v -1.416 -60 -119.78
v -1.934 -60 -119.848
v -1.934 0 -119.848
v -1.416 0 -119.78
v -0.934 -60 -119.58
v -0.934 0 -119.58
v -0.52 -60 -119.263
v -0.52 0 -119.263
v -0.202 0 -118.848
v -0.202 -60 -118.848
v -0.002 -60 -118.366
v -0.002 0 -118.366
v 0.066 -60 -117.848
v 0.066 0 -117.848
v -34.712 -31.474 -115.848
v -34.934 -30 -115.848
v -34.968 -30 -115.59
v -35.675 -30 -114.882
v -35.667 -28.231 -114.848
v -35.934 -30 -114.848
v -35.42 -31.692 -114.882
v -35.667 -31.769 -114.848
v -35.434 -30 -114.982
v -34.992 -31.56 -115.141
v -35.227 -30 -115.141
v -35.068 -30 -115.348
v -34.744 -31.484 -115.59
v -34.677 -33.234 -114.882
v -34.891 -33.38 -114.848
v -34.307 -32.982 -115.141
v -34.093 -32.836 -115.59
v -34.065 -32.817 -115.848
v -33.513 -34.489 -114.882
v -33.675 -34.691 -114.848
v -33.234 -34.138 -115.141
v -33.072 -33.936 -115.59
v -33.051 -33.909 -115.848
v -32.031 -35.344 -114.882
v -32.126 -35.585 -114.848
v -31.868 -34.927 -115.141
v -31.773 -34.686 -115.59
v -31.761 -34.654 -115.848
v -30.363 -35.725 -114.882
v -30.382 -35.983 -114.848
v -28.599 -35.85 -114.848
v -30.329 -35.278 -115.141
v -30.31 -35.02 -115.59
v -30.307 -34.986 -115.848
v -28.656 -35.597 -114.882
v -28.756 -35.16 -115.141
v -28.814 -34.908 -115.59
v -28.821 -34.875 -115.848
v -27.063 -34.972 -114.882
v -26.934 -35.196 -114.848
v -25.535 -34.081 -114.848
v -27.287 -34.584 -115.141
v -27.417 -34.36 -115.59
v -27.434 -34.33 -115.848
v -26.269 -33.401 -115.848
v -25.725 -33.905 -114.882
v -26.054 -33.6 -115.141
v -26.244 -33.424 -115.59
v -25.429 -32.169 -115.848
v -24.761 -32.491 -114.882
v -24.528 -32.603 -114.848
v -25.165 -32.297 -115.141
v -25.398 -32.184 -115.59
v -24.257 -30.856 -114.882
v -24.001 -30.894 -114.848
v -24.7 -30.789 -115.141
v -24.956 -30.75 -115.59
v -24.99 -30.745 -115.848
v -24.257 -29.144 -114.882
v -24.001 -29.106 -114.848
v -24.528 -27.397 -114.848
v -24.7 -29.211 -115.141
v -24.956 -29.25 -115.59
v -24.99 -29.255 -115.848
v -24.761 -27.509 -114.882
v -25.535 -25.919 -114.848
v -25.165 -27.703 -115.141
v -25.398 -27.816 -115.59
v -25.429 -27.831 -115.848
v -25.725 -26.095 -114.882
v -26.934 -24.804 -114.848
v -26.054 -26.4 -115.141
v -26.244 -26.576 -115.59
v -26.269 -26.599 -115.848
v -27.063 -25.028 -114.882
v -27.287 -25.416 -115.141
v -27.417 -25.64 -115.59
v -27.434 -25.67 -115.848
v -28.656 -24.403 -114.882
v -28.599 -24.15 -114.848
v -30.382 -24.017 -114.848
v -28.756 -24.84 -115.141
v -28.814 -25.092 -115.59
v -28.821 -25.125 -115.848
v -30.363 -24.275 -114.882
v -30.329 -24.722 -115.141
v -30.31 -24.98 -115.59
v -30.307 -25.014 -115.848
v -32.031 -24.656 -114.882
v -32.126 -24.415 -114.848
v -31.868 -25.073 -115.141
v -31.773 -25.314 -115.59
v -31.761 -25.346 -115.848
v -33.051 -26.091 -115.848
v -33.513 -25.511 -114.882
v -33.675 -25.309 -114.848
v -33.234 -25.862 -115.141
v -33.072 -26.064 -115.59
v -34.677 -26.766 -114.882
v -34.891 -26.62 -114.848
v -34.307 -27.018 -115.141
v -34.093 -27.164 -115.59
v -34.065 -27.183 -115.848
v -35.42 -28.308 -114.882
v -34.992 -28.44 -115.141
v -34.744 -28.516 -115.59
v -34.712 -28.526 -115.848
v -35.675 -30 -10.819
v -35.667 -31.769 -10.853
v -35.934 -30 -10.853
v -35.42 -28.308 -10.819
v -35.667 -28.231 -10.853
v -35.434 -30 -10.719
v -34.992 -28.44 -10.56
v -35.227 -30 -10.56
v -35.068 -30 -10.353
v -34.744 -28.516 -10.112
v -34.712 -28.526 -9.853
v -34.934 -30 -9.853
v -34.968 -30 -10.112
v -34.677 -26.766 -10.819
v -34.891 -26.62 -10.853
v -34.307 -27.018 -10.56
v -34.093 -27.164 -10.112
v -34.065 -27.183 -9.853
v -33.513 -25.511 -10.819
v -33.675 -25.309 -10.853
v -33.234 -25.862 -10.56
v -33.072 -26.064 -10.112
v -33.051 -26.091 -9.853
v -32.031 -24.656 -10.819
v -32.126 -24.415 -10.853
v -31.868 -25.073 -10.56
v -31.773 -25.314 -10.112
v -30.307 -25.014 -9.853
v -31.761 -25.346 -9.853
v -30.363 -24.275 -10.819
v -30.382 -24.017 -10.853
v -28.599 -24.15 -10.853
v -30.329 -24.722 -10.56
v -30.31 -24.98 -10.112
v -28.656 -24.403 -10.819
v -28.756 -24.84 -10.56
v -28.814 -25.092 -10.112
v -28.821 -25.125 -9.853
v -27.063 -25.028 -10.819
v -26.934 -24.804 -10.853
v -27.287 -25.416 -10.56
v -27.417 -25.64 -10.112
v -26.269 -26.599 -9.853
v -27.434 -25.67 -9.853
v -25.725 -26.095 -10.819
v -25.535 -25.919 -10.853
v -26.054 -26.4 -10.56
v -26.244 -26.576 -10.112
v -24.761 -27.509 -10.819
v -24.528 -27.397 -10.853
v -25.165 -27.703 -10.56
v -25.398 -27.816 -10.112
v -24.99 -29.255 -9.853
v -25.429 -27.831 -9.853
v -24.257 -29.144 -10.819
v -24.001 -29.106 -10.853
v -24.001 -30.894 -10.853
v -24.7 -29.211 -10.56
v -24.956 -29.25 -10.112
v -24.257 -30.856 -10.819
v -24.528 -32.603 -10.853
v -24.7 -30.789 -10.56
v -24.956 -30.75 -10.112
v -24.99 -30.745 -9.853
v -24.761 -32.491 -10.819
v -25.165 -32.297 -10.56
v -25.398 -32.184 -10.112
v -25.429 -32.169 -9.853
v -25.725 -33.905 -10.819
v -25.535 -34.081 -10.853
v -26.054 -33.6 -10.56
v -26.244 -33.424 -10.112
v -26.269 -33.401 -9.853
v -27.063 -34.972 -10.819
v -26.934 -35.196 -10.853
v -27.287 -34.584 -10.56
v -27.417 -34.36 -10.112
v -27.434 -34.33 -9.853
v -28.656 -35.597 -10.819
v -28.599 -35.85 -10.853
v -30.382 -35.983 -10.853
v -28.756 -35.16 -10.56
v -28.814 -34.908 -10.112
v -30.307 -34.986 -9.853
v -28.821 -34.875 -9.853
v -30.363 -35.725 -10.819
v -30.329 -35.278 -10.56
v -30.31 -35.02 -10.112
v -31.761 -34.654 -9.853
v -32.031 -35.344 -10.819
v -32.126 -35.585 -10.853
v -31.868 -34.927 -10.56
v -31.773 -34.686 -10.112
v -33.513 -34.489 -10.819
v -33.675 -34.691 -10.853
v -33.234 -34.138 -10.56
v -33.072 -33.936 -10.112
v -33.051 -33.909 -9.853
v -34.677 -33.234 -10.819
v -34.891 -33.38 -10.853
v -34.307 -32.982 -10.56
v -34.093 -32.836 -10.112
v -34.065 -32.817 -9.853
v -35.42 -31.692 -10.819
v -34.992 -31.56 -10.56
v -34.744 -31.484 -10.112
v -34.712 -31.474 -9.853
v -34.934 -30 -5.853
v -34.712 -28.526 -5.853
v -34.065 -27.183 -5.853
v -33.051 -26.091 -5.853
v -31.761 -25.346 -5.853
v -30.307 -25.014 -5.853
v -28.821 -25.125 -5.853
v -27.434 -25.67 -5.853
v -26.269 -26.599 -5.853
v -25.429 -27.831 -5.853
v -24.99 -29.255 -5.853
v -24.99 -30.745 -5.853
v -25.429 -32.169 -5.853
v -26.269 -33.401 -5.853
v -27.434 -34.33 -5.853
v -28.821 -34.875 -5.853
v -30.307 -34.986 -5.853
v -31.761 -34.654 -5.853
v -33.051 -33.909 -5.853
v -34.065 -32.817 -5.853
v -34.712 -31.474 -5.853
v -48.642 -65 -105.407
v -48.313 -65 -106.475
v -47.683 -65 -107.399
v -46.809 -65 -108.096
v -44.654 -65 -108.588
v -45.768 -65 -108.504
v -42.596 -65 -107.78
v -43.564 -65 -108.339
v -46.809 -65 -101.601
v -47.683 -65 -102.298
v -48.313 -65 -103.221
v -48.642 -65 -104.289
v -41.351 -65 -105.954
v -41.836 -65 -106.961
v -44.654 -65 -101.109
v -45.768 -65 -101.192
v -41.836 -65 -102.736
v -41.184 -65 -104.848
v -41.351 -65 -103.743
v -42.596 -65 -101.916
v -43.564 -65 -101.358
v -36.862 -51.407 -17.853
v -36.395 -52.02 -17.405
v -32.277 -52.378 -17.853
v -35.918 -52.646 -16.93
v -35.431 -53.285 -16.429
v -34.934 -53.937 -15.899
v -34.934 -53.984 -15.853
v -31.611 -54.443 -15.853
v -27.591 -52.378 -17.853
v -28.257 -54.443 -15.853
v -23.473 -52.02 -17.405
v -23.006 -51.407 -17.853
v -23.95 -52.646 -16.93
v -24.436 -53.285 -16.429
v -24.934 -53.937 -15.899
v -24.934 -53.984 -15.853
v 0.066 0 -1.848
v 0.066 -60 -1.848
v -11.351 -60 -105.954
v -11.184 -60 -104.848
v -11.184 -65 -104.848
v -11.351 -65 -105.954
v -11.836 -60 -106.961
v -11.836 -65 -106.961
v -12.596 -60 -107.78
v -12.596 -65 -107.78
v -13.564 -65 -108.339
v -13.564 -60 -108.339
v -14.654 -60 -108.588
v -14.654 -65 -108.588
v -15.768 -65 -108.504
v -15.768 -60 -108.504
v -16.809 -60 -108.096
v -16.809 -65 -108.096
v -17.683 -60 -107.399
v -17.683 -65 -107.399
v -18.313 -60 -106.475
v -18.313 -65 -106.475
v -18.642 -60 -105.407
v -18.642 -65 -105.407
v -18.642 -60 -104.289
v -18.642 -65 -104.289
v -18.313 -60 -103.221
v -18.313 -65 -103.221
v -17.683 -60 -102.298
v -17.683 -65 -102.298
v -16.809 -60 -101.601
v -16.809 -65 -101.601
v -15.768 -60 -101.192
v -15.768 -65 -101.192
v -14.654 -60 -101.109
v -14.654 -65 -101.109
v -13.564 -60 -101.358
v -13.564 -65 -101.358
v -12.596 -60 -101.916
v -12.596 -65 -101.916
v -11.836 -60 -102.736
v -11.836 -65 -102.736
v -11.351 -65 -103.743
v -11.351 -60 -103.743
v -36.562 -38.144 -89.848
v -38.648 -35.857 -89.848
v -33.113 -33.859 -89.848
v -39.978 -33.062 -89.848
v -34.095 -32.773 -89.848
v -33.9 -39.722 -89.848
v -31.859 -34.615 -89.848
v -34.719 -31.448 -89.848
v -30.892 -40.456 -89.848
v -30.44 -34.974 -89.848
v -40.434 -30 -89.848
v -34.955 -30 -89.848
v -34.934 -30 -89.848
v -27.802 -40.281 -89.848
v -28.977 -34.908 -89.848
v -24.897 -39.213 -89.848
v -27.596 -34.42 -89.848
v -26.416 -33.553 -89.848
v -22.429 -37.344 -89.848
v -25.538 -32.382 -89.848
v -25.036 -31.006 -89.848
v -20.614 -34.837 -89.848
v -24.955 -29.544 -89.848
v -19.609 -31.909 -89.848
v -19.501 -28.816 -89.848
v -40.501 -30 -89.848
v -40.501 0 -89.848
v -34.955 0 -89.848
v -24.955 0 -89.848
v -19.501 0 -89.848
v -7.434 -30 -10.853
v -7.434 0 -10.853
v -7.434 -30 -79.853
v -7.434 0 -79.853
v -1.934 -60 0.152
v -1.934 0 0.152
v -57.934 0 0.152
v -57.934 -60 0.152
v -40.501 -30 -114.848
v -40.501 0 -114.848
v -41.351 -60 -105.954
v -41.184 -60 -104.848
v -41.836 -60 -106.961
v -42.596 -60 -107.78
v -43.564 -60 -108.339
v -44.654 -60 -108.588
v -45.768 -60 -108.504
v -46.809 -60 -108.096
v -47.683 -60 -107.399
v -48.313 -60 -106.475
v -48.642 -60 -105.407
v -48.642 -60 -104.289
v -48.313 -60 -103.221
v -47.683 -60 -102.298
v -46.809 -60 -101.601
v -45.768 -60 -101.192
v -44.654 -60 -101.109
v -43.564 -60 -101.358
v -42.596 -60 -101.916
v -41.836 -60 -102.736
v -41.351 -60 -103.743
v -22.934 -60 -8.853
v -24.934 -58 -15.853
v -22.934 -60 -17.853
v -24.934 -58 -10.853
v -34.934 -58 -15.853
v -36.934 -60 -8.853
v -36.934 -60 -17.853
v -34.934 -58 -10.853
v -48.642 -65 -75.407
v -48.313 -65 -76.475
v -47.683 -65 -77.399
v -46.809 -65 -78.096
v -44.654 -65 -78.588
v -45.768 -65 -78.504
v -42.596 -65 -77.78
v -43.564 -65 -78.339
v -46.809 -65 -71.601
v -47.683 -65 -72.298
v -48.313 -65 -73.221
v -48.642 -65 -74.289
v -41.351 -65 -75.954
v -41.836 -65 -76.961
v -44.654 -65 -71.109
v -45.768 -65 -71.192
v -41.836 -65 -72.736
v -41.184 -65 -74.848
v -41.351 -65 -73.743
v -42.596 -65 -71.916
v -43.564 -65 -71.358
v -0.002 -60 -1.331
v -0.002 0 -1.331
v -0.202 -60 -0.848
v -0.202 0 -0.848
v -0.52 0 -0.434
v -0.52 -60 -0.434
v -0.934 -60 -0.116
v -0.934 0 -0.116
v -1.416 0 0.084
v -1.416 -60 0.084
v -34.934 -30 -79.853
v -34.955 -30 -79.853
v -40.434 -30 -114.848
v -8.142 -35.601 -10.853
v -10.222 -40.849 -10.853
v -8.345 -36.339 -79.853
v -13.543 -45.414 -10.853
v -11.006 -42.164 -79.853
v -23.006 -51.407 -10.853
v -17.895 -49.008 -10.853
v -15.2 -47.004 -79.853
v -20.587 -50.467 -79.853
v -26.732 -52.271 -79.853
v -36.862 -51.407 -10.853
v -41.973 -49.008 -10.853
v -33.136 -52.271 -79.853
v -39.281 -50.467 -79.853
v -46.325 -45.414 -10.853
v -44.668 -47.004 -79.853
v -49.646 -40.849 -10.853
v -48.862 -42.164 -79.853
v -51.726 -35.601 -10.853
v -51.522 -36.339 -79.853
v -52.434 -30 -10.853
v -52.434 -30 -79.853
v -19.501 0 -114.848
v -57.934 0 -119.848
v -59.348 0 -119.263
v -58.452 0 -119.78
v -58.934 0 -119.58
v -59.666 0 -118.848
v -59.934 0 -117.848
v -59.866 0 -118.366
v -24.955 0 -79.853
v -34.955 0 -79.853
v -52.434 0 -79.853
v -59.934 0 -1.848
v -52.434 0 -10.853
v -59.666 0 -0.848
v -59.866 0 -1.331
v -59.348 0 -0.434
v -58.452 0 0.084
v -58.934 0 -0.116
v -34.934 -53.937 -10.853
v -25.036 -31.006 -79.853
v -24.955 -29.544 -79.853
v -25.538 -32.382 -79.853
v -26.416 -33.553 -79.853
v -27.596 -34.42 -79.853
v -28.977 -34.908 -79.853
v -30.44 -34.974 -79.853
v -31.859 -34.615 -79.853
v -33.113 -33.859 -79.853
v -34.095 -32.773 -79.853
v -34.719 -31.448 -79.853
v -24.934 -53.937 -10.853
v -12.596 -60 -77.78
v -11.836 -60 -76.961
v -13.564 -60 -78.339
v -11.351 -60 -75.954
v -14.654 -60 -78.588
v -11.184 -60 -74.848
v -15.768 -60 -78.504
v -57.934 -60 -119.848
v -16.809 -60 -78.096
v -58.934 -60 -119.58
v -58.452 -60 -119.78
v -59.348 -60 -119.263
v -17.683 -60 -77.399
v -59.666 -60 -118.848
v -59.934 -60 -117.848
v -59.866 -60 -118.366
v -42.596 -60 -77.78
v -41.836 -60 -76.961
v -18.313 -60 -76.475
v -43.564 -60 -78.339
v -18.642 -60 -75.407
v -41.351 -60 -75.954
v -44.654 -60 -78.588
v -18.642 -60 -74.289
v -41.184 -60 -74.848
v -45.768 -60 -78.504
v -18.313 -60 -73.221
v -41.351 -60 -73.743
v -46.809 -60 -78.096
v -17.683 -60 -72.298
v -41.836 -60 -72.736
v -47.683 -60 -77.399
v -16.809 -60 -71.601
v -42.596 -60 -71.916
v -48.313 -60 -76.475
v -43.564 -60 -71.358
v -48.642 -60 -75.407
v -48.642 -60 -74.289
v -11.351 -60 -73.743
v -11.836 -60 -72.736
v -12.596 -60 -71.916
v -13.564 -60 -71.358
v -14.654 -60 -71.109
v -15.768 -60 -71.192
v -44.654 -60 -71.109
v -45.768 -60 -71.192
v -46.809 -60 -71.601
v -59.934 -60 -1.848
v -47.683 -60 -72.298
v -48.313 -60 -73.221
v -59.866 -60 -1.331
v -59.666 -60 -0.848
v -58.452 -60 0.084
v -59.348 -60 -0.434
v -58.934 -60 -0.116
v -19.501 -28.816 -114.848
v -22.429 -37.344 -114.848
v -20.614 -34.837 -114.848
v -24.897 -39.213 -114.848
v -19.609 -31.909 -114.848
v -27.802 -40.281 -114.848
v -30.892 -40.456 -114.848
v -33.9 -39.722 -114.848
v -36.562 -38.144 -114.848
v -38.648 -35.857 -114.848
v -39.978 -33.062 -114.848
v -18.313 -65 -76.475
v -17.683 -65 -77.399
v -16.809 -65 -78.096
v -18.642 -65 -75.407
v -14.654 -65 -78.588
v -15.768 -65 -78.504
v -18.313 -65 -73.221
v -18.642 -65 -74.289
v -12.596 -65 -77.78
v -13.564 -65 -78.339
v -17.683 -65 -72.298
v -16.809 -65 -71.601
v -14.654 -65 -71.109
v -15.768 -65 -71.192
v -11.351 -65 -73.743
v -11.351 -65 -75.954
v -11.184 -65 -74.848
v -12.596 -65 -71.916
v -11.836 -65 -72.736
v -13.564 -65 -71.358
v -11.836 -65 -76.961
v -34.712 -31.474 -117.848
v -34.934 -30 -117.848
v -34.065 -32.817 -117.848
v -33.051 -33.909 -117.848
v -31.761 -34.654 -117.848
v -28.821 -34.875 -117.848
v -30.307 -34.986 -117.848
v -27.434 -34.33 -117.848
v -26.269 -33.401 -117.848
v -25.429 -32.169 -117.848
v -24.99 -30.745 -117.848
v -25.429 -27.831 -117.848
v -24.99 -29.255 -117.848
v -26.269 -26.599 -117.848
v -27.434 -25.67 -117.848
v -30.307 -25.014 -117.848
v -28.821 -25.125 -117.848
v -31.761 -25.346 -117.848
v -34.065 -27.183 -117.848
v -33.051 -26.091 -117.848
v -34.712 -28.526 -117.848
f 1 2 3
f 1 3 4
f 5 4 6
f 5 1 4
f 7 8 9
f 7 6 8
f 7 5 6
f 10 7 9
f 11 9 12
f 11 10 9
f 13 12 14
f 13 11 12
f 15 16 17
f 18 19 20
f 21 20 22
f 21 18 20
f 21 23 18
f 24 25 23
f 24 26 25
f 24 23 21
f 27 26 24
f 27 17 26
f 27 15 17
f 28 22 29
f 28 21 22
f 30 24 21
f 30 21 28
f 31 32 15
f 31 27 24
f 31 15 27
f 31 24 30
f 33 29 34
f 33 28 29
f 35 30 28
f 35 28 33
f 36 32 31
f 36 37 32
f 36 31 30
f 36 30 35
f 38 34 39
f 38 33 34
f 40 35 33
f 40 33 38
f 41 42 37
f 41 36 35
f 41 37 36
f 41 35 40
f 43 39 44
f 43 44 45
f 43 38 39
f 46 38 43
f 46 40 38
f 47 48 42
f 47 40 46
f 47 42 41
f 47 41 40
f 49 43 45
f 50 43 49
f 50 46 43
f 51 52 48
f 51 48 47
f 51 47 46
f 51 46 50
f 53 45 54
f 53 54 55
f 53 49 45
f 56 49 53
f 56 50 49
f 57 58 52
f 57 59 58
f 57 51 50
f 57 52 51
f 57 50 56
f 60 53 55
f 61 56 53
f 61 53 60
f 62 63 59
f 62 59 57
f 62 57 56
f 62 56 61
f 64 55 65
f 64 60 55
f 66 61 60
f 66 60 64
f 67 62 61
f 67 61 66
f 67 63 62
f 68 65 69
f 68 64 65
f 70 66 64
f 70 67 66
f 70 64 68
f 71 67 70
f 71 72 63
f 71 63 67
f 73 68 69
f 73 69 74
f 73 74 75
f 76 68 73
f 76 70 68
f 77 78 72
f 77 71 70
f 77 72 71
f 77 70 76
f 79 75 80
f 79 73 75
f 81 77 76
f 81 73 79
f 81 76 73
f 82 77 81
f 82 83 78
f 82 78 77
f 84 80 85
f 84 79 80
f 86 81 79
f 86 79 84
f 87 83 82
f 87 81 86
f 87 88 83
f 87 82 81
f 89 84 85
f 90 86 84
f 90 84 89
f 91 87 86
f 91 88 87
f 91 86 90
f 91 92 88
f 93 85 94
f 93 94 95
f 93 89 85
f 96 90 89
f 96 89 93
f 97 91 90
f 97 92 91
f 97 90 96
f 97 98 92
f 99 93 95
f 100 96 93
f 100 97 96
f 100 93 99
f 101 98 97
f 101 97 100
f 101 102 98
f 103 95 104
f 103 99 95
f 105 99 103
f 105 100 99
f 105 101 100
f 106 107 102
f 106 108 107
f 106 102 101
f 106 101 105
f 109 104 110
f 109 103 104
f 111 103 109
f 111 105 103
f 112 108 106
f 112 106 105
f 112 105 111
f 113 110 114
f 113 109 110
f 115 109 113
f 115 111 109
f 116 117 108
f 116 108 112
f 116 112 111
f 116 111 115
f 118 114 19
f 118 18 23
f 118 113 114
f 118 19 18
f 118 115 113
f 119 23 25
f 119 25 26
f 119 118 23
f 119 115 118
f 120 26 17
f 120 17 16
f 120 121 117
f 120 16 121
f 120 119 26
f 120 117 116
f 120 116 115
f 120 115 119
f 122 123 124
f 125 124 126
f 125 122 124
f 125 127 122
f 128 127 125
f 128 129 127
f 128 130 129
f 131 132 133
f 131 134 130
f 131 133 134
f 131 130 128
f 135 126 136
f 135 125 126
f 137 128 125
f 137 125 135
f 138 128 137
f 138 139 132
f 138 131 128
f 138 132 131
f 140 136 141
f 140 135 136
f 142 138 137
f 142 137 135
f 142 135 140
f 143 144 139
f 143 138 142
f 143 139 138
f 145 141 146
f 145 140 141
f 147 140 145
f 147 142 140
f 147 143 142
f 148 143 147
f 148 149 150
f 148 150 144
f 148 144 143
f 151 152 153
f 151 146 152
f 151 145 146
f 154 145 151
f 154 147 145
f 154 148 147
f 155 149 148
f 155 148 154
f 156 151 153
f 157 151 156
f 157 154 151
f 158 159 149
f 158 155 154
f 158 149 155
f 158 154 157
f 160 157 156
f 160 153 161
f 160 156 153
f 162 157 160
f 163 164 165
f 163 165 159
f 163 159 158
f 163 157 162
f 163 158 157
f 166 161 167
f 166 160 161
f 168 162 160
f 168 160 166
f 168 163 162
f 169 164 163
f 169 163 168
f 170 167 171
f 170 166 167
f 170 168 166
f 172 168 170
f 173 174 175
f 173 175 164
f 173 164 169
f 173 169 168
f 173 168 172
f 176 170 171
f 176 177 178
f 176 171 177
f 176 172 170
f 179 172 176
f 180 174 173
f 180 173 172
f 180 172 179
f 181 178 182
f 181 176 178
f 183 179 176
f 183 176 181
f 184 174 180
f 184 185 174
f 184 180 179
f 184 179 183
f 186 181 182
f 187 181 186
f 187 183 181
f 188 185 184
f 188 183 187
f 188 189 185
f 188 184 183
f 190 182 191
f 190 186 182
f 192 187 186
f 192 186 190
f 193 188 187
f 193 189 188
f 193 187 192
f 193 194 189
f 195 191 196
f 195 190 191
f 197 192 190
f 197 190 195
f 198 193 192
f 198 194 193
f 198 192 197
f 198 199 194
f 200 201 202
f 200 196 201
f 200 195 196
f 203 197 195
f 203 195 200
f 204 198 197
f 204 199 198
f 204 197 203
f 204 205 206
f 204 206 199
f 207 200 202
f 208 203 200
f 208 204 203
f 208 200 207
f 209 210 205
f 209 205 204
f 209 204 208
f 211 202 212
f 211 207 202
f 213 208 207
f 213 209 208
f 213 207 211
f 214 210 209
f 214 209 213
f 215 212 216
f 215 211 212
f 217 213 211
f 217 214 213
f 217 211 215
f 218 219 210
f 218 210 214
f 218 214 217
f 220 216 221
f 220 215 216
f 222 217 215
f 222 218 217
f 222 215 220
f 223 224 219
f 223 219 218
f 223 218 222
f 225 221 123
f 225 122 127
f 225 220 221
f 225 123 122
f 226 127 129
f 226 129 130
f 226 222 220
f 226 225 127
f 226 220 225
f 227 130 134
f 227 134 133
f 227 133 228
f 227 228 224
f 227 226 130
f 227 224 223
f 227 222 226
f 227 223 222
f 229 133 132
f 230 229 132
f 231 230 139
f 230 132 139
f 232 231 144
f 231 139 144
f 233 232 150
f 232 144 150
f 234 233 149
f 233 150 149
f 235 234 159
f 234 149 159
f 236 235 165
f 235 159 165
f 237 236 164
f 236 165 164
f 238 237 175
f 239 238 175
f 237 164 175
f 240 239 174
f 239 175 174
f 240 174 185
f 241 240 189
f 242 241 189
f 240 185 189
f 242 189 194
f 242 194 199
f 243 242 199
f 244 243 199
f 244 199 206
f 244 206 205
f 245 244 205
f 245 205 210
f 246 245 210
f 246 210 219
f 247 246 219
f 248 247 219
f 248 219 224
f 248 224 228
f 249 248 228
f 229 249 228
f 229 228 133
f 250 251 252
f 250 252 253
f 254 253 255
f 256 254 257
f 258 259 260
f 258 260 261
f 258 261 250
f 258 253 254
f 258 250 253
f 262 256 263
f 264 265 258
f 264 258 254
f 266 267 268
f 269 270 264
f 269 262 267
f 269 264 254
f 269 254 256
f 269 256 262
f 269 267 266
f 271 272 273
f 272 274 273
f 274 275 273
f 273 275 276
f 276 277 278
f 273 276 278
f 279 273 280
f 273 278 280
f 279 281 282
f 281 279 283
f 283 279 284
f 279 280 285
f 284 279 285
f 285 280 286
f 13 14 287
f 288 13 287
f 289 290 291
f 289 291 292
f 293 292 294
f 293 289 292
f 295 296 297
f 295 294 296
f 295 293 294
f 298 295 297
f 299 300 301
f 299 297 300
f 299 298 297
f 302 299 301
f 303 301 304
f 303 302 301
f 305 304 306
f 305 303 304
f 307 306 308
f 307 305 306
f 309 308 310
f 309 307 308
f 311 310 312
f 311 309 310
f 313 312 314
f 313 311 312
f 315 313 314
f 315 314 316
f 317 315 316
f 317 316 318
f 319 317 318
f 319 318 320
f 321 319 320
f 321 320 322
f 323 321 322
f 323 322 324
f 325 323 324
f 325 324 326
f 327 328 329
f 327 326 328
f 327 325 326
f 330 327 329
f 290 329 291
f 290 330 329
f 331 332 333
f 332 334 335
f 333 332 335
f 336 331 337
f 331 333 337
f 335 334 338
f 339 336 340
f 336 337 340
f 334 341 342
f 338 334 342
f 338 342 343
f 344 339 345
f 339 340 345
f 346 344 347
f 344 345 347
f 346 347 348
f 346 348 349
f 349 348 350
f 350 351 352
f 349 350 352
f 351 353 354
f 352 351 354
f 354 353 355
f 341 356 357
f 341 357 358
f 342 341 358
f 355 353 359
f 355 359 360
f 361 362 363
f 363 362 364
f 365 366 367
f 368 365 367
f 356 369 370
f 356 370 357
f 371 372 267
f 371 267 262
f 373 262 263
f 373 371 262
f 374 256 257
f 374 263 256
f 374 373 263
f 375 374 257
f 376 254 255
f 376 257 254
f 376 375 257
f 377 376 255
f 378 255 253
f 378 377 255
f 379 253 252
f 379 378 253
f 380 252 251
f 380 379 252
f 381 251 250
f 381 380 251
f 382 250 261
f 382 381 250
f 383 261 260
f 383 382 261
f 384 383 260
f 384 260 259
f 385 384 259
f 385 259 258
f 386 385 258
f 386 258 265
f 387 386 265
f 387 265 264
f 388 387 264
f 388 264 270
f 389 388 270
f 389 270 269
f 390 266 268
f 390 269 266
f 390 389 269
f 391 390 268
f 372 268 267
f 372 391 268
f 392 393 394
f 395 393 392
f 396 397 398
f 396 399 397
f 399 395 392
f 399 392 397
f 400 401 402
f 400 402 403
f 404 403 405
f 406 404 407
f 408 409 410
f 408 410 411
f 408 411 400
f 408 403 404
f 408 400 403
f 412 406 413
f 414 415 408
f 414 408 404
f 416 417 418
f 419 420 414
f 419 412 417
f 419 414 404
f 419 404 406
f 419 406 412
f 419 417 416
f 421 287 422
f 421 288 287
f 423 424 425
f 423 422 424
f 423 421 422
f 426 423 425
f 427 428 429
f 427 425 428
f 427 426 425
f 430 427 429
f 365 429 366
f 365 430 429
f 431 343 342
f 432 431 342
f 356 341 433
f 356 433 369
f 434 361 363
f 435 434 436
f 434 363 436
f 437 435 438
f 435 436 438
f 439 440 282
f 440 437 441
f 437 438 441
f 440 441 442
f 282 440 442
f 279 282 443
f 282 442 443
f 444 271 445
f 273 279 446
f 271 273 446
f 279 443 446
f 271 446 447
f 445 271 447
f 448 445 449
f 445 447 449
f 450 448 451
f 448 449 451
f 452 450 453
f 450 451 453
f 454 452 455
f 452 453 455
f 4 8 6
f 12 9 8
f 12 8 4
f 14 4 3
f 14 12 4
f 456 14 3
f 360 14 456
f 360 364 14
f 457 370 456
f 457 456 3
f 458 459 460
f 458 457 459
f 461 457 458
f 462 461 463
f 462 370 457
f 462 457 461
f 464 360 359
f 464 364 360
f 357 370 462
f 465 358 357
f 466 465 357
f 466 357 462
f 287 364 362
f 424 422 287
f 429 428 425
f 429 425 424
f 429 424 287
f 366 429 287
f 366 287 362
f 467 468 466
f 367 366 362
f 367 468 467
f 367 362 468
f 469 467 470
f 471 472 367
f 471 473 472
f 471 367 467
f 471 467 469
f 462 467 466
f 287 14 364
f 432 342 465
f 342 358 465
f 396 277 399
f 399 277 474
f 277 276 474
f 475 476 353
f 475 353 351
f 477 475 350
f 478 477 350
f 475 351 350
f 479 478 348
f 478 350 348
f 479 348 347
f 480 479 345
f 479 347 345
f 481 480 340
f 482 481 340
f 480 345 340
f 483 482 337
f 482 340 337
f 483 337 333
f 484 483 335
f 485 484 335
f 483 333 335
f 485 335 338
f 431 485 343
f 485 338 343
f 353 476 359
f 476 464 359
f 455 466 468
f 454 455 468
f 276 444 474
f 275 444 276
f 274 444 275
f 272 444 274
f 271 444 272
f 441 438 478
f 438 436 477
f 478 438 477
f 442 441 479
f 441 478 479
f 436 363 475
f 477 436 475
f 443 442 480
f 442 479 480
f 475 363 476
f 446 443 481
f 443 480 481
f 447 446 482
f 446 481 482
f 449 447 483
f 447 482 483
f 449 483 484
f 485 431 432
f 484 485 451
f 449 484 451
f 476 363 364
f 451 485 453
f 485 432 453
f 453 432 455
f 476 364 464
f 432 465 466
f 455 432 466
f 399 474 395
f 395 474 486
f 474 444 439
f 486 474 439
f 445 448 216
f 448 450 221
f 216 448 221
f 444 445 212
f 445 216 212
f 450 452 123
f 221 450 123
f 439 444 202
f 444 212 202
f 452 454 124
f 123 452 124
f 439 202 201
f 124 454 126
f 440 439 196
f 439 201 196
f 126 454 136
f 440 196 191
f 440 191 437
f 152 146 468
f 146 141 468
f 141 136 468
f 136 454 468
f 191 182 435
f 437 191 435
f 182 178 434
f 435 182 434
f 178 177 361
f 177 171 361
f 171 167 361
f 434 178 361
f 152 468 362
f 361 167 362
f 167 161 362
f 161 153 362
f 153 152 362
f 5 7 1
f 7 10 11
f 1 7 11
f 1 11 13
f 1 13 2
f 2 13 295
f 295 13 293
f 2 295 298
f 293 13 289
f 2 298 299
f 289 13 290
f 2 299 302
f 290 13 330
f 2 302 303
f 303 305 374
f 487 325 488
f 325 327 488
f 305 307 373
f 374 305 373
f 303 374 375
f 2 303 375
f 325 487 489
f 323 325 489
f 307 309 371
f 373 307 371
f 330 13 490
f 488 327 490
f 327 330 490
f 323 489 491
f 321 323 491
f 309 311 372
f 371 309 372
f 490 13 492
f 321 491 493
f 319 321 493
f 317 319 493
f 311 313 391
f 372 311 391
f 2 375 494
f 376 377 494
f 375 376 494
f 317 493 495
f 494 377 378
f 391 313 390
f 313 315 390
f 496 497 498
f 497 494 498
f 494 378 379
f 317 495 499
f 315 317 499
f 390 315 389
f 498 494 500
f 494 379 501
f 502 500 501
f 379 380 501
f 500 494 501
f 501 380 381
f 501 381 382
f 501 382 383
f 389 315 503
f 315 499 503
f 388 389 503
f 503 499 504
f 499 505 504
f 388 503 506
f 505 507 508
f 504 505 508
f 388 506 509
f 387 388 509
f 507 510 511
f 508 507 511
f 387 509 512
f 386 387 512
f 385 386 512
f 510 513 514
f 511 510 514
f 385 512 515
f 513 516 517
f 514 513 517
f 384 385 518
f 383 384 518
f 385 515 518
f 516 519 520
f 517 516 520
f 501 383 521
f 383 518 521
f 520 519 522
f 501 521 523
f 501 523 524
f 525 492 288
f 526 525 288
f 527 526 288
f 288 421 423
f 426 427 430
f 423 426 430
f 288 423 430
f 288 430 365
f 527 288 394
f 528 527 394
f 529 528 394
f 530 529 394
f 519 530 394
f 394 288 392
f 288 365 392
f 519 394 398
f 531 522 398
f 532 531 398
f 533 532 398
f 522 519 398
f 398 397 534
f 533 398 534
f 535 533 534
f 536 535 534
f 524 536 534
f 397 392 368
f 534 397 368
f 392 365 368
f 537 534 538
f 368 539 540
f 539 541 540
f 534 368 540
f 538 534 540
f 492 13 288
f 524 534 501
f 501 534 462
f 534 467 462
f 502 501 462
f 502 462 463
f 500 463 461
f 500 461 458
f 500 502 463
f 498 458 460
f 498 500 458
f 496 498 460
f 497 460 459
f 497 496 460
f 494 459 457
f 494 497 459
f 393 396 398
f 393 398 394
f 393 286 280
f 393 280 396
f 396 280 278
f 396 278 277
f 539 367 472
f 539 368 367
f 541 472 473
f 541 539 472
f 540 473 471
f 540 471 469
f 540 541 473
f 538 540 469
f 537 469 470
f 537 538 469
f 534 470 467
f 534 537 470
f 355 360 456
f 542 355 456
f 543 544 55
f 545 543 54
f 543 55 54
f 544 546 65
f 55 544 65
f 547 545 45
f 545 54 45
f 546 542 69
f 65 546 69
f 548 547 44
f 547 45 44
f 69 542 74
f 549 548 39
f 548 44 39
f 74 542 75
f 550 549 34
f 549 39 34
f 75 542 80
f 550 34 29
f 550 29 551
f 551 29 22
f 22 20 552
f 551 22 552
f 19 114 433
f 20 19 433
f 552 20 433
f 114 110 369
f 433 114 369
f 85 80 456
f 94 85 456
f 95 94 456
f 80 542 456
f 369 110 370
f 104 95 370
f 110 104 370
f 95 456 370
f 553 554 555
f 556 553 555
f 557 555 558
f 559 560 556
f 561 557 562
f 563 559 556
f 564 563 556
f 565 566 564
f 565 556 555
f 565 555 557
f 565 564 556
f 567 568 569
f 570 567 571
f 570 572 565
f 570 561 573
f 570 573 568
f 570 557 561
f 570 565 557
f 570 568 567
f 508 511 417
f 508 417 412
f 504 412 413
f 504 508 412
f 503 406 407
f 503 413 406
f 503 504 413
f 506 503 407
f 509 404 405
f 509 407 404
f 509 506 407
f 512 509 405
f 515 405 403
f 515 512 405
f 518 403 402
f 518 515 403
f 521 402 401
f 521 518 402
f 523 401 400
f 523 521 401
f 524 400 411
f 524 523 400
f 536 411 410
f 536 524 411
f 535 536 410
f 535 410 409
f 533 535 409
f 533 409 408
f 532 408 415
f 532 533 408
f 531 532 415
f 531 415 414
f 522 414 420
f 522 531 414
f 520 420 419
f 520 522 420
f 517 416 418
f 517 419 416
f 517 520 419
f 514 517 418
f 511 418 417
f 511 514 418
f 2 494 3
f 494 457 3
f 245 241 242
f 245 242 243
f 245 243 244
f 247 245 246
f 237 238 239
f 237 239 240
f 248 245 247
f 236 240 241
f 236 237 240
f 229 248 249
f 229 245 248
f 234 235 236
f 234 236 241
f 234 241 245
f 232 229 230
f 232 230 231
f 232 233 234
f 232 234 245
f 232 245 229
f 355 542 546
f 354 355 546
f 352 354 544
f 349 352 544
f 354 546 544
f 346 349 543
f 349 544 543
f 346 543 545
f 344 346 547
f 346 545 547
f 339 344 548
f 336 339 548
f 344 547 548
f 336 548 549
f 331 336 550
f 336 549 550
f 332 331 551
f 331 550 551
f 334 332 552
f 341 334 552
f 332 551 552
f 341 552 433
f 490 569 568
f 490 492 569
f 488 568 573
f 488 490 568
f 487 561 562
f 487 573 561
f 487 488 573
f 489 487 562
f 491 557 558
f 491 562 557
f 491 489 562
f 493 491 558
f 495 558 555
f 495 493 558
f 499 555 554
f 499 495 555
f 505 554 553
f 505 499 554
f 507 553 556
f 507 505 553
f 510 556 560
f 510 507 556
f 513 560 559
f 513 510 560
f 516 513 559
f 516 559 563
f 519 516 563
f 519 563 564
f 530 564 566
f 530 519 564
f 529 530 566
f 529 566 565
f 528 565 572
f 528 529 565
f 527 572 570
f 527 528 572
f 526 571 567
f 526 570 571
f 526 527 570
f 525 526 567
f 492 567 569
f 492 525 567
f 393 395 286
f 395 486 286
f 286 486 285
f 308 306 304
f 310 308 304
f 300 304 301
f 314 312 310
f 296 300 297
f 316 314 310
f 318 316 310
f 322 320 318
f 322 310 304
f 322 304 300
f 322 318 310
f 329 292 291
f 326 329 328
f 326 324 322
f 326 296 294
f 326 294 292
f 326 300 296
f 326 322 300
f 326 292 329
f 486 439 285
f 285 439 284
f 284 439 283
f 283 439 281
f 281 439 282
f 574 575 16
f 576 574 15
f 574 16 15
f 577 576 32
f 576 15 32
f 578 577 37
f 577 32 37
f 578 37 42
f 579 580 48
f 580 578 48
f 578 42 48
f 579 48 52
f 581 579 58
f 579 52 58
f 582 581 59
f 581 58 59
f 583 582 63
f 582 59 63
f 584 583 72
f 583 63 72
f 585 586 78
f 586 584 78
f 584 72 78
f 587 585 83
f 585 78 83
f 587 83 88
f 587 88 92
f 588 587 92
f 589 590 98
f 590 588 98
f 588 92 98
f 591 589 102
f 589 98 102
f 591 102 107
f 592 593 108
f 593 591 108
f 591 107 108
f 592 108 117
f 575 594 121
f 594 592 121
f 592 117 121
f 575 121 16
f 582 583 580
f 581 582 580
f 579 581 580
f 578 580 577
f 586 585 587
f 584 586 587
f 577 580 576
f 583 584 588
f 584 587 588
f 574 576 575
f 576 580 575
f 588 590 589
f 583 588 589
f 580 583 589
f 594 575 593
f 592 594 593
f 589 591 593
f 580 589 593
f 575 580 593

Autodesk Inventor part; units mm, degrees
sketch "Sketch1" plane through (0, 0, 0) normal (0, 1, 0) x (-1, 0, 0)
  line L0 (-0.0661, 0.1517) -> (59.9339, 0.1517)
  line L1 (59.9339, 0.1517) -> (59.9339, -119.8483)
  line L2 (59.9339, -119.8483) -> (-0.0661, -119.8483)
  line L3 (-0.0661, -119.8483) -> (-0.0661, 0.1517)
  line L4 (29.9339, -119.8483) -> (29.9339, 0.1517)
  circle A0 centre (29.9339, -54.8547) radius 22.5
  line L5 (19.5008, -89.8484) -> (19.5008, -114.8484)
  line L6 (19.5008, -114.8484) -> (40.5008, -114.8484)
  line L7 (40.5008, -114.8484) -> (40.5008, -89.8484)
  line L8 (40.5008, -89.8484) -> (19.5008, -89.8484)
  line L9 (19.5008, -89.8484) -> (40.5008, -114.8484) construction
  line L10 (19.5008, -114.8484) -> (40.5008, -89.8484) construction
  line L11 (19.5008, -89.8484) -> (44.5008, -89.8484) construction
  line L12 (24.9546, -79.8533) -> (24.9546, -89.8533)
  line L13 (24.9546, -89.8533) -> (34.9546, -89.8533)
  line L14 (34.9546, -89.8533) -> (34.9546, -79.8533)
  line L15 (34.9546, -79.8533) -> (24.9546, -79.8533)
  line L16 (24.9546, -79.8533) -> (34.9546, -89.8533) construction
  line L17 (24.9546, -89.8533) -> (34.9546, -79.8533) construction
  line L18 (24.9546, -79.8533) -> (34.9546, -79.8533) construction
  line L19 (7.4339, -10.8533) -> (7.4339, -79.8533)
  line L20 (7.4339, -79.8533) -> (52.4339, -79.8533)
  line L21 (52.4339, -79.8533) -> (52.4339, -10.8533)
  line L22 (52.4339, -10.8533) -> (7.4339, -10.8533)
  line L23 (7.4339, -10.8533) -> (52.4339, -79.8533) construction
  line L24 (7.4339, -79.8533) -> (52.4339, -10.8533) construction
  line L25 (7.4339, -10.8533) -> (76.4339, -10.8533) construction
  line L26 (34.9339, -5.8533) -> (24.9339, -5.8533)
  line L27 (24.9339, -5.8533) -> (24.9339, -15.8533)
  line L28 (24.9339, -15.8533) -> (34.9339, -15.8533)
  line L29 (34.9339, -15.8533) -> (34.9339, -5.8533)
  line L30 (34.9339, -5.8533) -> (24.9339, -15.8533) construction
  line L31 (24.9339, -5.8533) -> (34.9339, -15.8533) construction
  point P0 (0, 0)
  point P1 (29.9339, -114.8483)
  point P2 (30.4342, -89.8533)
  point P3 (29.9546, -89.8533)
  point P4 (29.9339, -79.8533)
  point P5 (30.0136, -77.3546)
  point P6 (29.9339, -25)
  point P7 (30.0008, -102.3484)
  point P8 (29.9339, -10.8533)
  point P9 (29.9546, -84.8533)
  point P10 (29.9339, -10.8533)
  point P11 (29.9339, -45.3533)
  point P12 (34.9546, -79.8533)
  point P13 (24.9546, -79.8533)
  point P14 (24.9546, -89.8484)
  point P15 (34.9546, -89.8484)
  point P16 (34.9339, -10.8533)
  point P17 (24.9339, -10.8533)
  dimension "d0" = 60
  dimension "d1" = 120
  dimension "d2" = 45
  dimension "d3" = 5
  dimension "d4" = 25
  dimension "d6" = 12.5
  dimension "d7" = 10
  dimension "d8" = 2.5
  dimension "d9" = 22.5
  dimension "d10" = -69
  dimension "d11" = 25
  dimension "d12" = 90
  dimension "d13" = 21
  dimension "d14" = 5
  dimension "d15" = 10
  dimension "d16" = 90
  dimension "d17" = 10
  dimension "d18" = -69
  dimension "d19" = 90
  dimension "d20" = -34.5
  dimension "d21" = 45
  dimension "d42" = 10
  dimension "d43" = 10
extrude "Extrusion1" add sketch "Sketch1" against normal blind 60
sketch "Sketch2" plane through (0.0661, 0, -119.8483) normal (0, 0, -1) x (-1, 0, 0)
  line L0 (0, 0) -> (60, 0) projected
  line L1 (0, 0) -> (0, -60) projected
  line L2 (60, -60) -> (0, -60) projected
  line L3 (60, 0) -> (60, -60) projected
  point P0 (0.0661, 0)
  point P1 (30, -30)
ref_plane "Work Plane1" through (-19.5008, 0, -114.8484) normal (0, 0, -1) x (-1, 0, 0)
ref_plane "Work Plane2" through (-19.5008, 0, -89.8484) normal (0, 0, -1) x (-1, 0, 0)
ref_plane "Work Plane3" through (-24.9546, 0, -79.8533) normal (0, 0, -1) x (-1, 0, 0)
ref_plane "Work Plane5" through (-7.4339, 0, -5.8533) normal (0, 0, -1) x (-1, 0, 0)
ref_plane "Work Plane4" through (-7.4339, 0, -10.8533) normal (0, 0, -1) x (-1, 0, 0)
sketch "Sketch3" plane through (-19.5008, 0, -114.8484) normal (0, 0, -1) x (-1, 0, 0)
  circle A0 centre (10.433, -30) radius 10.5
  point P0 (-19.5008, 0)
  dimension "d25" = 21
ref_plane "Work Plane6" through (-29.9339, -30, -119.8483) normal (0, 1, 0) x (1, 0, 0)
extrude "Extrusion3" cut sketch "Sketch1" against normal up to surface (30 mm away) contours L22 L29 L28 L4 | L4 L28 L27 L22 | L6 L5 L8 L12 L13 L4 | L4 L13 L14 L8 L7 L6 | L28 L29 L22 L21 A0 L4 | L4 A0 L19 L22 L27 L28 | L13 L12 L8 L4 | L4 L8 L14 L13 | A0 L4 | L4 A0 | L8 L12 L15 L4 | L4 L15 L14 L8 | A0 L21 L20 L15 L4 | L4 L15 L20 L19 A0
sketch "Sketch4" plane through (-19.5008, 0, -89.8484) normal (0, 0, -1) x (-1, 0, 0)
  circle A0 centre (10.433, -30) radius 5
  point P0 (-19.5008, 0)
  point P1 (15.4537, 0)
  point P2 (15.4537, 0)
  point P3 (15.4537, 0)
  point P4 (5.4537, 0)
  point P5 (5.4537, 0)
  point P6 (5.4537, 0)
  dimension "d30" = 10
sketch "Sketch5" plane through (-24.9546, 0, -79.8533) normal (0, 0, -1) x (-1, 0, 0)
  circle A0 centre (4.9793, -30) radius 22.5
  point P0 (-24.9546, 0)
  dimension "d31" = 45
extrude "Extrusion4" cut sketch "Sketch3" against normal up to surface (25 mm away)
ref_plane "Work Plane7" through (0.0661, 0, -117.8483) normal (0, 0, -1) x (-1, 0, 0)
extrude "Extrusion5" cut sketch "Sketch4" against normal up to surface (83.9952 mm away)
extrude "Extrusion6" cut sketch "Sketch5" against normal up to surface (69 mm away)
extrude "Extrusion7" cut sketch "Sketch4" along normal up to surface (27.9998 mm away)
fillet "Fillet1" radius 2 4 edges at (-59.9339, -30, 0.1517) (0.0661, -30, 0.1517) (0.0661, -30, -119.8483) (-59.9339, -30, -119.8483)
extrude "Extrusion8" cut sketch "Sketch1" against normal through all contours L22 L29 L28 L4 | L4 L28 L27 L22
chamfer "Chamfer1" distance 2 angle 45 4 edges at (-29.9339, -60, -10.8533) (-24.9339, -60, -13.3533) (-29.9339, -60, -15.8533) (-34.9339, -60, -13.3533)
chamfer "Chamfer2" distance 2 angle 45 3 edges at (-34.9339, -51.9374, -13.3533) (-29.9339, -52.5, -15.8533) (-24.9339, -51.9374, -13.3533)
fillet "Fillet2" radius 1 1 edges at (-24.9339, -30, -114.8484)
fillet "Fillet3" radius 1 1 edges at (-24.9339, -30, -10.8533)
sketch "Sketch6" plane through (0, -60, 0) normal (0, -1, 0) x (1, 0, 0)
  arc A0 (-59.9339, -117.8483) -> (-57.9339, -119.8483) centre (-57.9339, -117.8483) ccw projected
  line L0 (-57.9339, -119.8483) -> (-1.9339, -119.8483) projected
  arc A1 (-1.9339, -119.8483) -> (0.0661, -117.8483) centre (-1.9339, -117.8483) ccw projected
  line L1 (0.0661, -117.8483) -> (0.0661, -1.8483) projected
  arc A2 (0.0661, -1.8483) -> (-1.9339, 0.1517) centre (-1.9339, -1.8483) ccw projected
  line L2 (-1.9339, 0.1517) -> (-57.9339, 0.1517) projected
  arc A3 (-57.9339, 0.1517) -> (-59.9339, -1.8483) centre (-57.9339, -1.8483) ccw projected
  line L3 (-59.9339, -1.8483) -> (-59.9339, -117.8483) projected
  line L4 (-36.9339, -8.8533) -> (-36.9339, -17.8533) projected
  line L5 (-22.9339, -8.8533) -> (-36.9339, -8.8533) projected
  line L6 (-22.9339, -17.8533) -> (-22.9339, -8.8533) projected
  line L7 (-36.9339, -17.8533) -> (-22.9339, -17.8533) projected
  line L8 (-29.9339, 0.1517) -> (-29.9339, -119.8483)
  line L9 (0.0661, -59.8483) -> (-59.9339, -59.8483)
  line L10 (-29.9339, -59.8483) -> (-29.9339, -119.8483)
  line L11 (-29.9339, -59.8483) -> (-29.9339, -89.8483)
  line L12 (-29.9339, -89.8483) -> (-29.9339, -119.8483)
  line L13 (-29.9339, -89.8483) -> (-59.9339, -89.8483)
  line L14 (-59.9339, -89.8483) -> (-59.9339, -119.8483)
  line L15 (-59.9339, -119.8483) -> (-29.9339, -119.8483)
  line L16 (-29.9339, -119.8483) -> (-29.9339, -89.8483)
  circle A4 centre (-44.9339, -104.8483) radius 3.75
  circle A5 centre (-14.9339, -104.8483) radius 3.75
  circle A6 centre (-44.9339, -74.8483) radius 3.75
  circle A7 centre (-14.9339, -74.8483) radius 3.75
  point P0 (0, 0)
  point P1 (-29.9339, -74.8483)
  point P2 (-29.9339, -104.8483)
  dimension "d58" = 7.5
  dimension "d61" = 30
  dimension "d64" = 30
extrude "Extrusion10" add sketch "Sketch6" along normal blind 5 contours A4 | A5 | A6 | A7
equation "\"d4\" = d11"
equation "\"d6\" = 0.5 * d4"
equation "\"d7\" = d15"
equation "\"d9\" = 0.5 * d2"
equation "\"d14\" = 0.5 * d7"
equation "\"d18\" = d10"
equation "\"d20\" = 0.5 * d10"
equation "\"d21\" = d2"
equation "\"d31\" = d2"
properties part number "housing_V2_3DPrint"
